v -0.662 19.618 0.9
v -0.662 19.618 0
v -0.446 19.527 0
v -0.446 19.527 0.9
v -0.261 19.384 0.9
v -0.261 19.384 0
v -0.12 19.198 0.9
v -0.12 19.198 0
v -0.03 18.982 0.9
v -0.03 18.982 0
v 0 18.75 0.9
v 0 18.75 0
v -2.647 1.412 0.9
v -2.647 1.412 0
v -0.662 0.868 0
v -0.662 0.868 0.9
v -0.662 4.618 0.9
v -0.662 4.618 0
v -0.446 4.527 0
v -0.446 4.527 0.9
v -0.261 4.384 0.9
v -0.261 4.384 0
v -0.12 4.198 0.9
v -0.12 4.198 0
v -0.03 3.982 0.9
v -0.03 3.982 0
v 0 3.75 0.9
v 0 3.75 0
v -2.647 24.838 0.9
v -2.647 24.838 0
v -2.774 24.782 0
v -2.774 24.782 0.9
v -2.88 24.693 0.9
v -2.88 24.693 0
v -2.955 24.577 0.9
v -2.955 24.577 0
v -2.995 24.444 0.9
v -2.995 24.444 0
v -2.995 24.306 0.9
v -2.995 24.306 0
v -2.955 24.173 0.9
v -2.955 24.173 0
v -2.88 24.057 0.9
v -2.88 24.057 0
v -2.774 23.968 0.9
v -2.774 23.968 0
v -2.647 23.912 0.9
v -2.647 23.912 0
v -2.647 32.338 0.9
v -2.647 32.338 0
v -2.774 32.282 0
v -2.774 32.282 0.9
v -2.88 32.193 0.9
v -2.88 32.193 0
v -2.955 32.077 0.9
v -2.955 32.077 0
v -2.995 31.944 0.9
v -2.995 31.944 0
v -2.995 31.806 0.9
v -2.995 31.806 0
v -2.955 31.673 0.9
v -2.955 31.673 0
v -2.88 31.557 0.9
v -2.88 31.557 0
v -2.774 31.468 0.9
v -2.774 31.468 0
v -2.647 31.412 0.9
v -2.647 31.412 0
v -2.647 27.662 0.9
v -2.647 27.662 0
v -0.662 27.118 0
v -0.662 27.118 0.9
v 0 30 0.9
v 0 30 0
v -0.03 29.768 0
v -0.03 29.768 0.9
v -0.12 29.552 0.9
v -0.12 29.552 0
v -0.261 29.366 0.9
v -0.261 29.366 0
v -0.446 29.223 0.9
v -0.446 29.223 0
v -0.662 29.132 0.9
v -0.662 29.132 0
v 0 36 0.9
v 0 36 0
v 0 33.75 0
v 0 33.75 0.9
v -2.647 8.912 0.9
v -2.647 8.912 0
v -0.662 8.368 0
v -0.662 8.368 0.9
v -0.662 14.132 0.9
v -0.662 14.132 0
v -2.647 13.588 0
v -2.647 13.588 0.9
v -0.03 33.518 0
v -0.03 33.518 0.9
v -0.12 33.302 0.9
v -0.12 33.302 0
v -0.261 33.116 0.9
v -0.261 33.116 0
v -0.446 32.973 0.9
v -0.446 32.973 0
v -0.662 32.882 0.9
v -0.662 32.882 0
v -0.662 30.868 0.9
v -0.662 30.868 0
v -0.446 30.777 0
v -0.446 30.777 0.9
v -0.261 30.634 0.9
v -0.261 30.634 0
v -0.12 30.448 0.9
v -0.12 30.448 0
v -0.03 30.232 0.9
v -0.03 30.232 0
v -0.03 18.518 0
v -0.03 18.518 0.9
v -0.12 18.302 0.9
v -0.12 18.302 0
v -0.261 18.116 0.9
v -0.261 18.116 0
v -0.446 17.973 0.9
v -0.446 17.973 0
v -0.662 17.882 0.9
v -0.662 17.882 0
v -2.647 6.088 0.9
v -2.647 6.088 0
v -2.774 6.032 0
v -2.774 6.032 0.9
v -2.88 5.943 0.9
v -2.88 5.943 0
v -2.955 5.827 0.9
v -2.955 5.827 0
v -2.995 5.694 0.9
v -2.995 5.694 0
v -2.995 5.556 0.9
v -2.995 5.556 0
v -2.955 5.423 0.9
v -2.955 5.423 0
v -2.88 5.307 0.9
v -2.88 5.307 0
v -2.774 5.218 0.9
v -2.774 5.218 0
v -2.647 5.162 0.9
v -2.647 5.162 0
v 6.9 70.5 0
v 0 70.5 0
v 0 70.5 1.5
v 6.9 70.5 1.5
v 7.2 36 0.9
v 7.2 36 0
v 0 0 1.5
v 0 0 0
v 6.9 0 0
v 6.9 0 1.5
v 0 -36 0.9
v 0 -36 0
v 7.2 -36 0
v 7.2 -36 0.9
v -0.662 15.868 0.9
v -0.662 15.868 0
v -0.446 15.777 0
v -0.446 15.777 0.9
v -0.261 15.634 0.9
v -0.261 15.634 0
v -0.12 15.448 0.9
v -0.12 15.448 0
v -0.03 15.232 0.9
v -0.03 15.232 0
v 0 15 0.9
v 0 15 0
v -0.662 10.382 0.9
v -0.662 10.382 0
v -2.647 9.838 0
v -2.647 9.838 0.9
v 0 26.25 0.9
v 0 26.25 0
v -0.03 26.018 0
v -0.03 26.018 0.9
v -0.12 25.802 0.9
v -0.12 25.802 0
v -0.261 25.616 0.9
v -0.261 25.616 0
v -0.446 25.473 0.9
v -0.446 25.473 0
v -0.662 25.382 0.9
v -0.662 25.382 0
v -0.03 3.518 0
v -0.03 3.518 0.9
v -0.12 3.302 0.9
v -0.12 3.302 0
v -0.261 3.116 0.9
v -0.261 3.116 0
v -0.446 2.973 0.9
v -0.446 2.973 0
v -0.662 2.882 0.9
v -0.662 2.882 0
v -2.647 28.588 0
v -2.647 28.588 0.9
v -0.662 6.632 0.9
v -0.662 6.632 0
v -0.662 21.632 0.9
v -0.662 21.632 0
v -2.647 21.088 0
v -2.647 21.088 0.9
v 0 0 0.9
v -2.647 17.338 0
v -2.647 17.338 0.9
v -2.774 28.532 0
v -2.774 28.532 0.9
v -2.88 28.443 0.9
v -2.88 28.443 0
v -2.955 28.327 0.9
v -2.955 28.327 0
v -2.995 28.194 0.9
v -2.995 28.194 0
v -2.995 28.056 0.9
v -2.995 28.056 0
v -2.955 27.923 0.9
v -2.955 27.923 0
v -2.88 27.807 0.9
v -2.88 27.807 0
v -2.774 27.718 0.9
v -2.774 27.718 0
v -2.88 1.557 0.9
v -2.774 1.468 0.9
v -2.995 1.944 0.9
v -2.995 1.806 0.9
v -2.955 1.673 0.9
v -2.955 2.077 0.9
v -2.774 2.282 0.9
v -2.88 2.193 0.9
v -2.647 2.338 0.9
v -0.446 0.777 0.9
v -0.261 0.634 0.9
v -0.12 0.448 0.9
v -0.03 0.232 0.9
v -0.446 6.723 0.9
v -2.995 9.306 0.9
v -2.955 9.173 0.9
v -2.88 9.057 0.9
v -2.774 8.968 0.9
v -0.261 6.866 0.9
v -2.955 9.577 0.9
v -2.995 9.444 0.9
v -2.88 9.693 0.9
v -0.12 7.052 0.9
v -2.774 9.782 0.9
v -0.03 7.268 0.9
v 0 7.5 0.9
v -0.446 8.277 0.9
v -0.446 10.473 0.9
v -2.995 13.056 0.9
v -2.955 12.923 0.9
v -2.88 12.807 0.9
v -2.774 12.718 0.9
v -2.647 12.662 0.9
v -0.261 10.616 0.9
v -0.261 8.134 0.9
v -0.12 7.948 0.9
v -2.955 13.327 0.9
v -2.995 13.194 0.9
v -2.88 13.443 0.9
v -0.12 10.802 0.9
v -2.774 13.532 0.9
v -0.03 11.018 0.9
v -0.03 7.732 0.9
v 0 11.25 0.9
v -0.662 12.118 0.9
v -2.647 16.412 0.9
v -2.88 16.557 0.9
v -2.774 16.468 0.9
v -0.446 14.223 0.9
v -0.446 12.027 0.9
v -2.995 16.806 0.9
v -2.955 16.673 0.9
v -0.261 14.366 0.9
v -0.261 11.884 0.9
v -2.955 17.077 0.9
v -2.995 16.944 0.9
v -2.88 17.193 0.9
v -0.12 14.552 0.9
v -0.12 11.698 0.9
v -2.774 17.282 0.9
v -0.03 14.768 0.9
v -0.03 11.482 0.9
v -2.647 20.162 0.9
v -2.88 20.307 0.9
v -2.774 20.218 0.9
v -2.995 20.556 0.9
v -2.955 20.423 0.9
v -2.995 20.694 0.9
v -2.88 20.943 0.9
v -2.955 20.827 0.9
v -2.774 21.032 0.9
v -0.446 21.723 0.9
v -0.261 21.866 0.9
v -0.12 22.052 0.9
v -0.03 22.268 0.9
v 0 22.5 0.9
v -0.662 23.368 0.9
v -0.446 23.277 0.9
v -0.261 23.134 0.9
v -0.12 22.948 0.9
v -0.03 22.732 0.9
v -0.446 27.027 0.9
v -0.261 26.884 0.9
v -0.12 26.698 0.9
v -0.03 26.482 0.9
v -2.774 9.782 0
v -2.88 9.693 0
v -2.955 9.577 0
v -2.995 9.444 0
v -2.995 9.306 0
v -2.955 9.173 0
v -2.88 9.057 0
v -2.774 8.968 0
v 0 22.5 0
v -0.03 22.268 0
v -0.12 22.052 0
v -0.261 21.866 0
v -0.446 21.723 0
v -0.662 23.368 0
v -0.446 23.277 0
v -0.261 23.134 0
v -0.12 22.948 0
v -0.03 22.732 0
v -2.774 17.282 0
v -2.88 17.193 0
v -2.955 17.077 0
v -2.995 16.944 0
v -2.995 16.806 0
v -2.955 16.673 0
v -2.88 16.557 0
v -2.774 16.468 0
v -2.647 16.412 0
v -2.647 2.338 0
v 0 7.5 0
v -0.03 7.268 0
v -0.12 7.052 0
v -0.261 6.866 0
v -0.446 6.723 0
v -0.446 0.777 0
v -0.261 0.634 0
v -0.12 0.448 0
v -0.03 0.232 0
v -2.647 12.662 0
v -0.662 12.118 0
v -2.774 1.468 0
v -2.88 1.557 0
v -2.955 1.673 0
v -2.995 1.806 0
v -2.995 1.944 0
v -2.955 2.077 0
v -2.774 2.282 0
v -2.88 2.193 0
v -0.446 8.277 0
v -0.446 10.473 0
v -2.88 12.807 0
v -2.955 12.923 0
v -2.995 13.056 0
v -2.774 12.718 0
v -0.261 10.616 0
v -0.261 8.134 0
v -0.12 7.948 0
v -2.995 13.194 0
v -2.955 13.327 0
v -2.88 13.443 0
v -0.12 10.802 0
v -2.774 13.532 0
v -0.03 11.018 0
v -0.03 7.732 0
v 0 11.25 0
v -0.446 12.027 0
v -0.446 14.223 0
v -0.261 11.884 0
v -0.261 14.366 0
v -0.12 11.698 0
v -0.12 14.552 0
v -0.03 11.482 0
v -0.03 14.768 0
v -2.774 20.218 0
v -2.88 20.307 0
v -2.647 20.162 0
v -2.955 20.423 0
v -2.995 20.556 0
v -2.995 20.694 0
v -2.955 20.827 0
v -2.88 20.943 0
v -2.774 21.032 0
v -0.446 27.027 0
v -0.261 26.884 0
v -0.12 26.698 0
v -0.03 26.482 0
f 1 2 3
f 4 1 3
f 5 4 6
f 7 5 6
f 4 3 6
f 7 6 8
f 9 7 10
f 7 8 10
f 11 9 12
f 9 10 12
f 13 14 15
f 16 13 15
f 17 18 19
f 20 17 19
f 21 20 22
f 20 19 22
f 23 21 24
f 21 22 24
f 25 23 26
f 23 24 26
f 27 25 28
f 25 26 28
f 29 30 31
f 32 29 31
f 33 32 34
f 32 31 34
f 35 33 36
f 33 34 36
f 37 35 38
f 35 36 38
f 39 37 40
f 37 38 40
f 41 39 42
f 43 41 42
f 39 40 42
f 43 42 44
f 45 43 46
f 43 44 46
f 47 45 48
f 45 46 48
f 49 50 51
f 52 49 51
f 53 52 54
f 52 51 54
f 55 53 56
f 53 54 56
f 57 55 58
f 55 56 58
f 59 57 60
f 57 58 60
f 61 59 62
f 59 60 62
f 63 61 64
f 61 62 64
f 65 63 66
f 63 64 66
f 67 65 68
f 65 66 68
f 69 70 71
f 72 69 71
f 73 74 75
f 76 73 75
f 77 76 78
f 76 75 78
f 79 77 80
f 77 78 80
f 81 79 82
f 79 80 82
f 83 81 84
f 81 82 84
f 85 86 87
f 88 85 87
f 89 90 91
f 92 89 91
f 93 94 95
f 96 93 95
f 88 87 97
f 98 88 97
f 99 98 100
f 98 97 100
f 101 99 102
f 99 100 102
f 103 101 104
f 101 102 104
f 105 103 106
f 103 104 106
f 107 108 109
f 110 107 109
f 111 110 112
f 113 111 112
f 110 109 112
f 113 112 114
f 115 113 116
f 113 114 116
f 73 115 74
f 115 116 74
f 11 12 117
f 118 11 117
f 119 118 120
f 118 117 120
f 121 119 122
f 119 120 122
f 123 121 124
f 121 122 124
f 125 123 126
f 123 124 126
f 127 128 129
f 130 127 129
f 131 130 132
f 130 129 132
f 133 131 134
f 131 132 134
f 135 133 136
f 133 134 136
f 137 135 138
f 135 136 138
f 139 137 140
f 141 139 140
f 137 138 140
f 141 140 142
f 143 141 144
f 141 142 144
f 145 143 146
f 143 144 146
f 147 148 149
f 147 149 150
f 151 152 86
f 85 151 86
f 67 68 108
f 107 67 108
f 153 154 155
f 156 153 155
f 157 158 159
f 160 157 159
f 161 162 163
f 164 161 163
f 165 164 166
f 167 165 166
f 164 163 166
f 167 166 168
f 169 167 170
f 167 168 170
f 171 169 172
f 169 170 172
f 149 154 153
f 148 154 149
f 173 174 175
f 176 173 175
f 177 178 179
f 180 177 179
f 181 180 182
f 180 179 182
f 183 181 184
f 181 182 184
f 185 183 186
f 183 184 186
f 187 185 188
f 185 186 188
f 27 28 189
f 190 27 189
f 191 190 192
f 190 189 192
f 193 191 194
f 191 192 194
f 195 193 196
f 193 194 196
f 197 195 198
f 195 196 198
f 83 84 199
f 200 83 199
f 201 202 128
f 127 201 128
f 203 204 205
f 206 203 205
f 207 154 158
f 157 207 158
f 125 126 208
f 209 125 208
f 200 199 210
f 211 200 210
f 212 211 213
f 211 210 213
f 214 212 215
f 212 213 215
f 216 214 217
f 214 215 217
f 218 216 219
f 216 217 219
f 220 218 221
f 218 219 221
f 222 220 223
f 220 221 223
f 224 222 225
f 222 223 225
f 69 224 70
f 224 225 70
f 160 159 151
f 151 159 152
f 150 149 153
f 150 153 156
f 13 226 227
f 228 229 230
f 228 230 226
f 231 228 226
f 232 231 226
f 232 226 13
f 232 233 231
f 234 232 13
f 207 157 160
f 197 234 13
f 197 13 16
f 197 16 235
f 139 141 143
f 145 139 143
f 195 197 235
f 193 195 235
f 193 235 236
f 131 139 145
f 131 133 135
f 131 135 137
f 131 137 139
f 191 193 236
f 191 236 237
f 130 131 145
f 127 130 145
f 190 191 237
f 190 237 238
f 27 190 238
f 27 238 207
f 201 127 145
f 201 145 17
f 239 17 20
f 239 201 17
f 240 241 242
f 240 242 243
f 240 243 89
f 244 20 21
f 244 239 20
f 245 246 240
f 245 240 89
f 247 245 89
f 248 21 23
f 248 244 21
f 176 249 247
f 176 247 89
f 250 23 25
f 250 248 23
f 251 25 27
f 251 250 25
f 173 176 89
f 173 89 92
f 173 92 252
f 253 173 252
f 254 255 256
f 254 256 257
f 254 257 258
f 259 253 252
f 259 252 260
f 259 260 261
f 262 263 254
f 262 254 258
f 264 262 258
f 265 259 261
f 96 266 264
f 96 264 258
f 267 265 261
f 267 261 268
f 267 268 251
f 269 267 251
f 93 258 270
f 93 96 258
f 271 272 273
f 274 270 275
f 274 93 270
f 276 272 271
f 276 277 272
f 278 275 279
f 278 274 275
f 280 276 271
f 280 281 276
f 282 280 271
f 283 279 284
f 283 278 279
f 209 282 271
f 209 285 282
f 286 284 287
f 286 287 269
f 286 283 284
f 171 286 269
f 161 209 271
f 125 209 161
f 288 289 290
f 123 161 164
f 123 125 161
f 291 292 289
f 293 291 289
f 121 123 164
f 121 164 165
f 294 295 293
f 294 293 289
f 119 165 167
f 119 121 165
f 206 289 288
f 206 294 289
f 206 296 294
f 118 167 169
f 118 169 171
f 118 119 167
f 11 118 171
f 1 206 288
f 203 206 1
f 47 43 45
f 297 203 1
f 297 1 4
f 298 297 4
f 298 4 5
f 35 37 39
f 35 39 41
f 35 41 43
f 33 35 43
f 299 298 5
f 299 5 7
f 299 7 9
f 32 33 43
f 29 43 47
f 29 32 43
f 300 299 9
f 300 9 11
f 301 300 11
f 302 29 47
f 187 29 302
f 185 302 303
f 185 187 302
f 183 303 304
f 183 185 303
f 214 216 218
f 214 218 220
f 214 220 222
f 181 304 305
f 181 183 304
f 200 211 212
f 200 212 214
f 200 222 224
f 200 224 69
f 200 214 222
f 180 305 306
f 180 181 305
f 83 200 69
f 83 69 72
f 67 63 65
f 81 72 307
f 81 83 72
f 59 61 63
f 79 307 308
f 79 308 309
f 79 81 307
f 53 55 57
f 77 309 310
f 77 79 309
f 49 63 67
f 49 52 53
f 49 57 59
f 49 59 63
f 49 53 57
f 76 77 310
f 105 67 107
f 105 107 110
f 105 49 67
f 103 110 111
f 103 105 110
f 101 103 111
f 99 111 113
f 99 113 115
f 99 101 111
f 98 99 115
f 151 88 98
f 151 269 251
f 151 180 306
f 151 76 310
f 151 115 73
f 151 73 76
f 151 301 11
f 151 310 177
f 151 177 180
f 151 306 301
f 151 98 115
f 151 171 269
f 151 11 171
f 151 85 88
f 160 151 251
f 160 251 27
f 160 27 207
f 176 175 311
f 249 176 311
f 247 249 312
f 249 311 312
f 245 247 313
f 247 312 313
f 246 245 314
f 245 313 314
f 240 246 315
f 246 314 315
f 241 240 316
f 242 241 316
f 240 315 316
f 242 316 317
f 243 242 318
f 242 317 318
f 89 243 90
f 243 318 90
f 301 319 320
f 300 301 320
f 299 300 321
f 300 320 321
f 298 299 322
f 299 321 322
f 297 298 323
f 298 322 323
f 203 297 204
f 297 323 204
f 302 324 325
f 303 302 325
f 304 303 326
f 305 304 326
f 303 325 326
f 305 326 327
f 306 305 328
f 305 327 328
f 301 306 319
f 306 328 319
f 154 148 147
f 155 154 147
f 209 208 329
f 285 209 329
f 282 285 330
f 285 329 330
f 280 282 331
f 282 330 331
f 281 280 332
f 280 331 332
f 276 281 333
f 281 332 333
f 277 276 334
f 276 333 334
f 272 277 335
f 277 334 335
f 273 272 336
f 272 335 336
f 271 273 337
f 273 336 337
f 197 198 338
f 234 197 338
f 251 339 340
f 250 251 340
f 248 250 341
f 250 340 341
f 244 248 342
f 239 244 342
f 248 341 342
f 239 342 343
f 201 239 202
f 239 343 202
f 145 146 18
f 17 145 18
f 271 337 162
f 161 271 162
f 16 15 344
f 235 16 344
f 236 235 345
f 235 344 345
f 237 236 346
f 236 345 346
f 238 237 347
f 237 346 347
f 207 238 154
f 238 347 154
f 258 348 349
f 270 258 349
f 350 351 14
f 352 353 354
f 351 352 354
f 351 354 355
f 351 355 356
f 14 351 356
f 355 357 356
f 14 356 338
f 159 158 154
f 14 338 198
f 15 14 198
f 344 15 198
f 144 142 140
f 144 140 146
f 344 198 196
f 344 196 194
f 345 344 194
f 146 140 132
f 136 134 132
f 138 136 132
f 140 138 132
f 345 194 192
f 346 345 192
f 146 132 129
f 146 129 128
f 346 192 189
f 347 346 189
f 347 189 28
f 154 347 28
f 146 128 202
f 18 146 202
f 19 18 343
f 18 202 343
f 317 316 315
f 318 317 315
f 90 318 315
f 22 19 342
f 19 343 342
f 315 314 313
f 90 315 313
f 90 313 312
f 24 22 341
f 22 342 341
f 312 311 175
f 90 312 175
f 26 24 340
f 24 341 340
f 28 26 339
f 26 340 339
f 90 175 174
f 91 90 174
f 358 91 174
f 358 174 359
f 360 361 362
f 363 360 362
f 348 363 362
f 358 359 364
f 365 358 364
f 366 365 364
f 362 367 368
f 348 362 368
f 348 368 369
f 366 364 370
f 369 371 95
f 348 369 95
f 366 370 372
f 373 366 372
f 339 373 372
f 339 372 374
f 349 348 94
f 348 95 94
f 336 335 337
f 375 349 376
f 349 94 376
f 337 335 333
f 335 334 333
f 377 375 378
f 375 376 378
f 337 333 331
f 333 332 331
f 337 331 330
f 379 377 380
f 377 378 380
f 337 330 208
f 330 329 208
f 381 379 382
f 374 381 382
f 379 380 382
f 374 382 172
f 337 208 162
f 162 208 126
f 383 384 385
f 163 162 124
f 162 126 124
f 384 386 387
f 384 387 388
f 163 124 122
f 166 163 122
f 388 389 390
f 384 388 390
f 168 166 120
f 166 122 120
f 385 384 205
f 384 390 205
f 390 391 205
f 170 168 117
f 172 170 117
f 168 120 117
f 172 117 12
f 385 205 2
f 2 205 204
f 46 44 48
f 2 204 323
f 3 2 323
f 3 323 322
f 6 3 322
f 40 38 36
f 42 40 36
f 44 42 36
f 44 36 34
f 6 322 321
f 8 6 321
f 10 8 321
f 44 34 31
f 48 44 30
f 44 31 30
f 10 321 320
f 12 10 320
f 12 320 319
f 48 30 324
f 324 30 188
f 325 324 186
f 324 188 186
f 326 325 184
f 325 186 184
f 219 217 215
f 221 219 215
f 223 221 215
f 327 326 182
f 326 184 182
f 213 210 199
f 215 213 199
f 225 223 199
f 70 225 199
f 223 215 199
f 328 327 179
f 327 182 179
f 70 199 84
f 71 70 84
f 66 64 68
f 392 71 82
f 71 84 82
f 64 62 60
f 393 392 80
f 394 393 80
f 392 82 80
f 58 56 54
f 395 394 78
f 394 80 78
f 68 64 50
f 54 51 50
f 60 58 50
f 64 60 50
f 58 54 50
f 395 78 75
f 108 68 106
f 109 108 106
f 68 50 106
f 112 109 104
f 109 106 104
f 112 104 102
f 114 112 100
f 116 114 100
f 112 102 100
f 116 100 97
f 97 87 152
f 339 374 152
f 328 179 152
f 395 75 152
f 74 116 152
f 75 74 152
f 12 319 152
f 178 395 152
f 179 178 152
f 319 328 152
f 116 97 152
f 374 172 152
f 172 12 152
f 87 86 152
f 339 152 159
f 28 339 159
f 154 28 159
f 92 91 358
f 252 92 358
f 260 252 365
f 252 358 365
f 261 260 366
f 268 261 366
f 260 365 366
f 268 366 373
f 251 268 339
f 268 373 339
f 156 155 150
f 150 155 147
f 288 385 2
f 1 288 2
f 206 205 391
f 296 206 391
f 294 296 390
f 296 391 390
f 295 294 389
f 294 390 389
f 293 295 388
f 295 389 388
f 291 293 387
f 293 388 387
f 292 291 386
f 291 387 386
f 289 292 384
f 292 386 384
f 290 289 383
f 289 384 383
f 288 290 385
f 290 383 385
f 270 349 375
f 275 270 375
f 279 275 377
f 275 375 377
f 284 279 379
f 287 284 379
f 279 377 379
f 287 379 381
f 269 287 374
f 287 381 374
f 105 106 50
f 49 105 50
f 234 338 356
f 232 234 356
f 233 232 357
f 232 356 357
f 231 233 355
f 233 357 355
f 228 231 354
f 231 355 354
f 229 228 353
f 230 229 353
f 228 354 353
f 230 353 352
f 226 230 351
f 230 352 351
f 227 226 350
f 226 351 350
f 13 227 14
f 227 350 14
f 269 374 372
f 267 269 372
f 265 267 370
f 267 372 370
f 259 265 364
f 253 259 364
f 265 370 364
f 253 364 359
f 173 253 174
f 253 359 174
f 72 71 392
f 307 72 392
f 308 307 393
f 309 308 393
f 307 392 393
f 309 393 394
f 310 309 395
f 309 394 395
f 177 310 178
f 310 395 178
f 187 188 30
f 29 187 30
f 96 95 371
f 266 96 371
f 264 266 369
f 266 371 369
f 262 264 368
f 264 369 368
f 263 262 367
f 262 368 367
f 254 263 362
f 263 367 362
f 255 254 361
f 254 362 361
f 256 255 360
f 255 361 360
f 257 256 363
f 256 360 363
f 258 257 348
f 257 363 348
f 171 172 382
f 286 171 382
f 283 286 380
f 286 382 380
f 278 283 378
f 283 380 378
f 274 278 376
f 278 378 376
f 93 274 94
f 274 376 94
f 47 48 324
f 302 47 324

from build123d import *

# Parameters (mm, degrees)
F1_DEPTH = 0.3
F2_W     = 2.3
F2_H     = 23.5
F3_DEPTH = 0.5
F4_SCALE = 3


with BuildPart() as f1:
    # F0 (on Top) → F1 (new body)
    with BuildSketch(Plane.XY):
        with BuildLine():
            Line((0, 10), (0, 11.25))
            ThreePointArc((0, 11.25), (-0.0614693449, 11.0680573536), (-0.2206875105, 10.9606740091))
            Line((-0.2206875105, 10.9606740091), (-0.8822999944, 10.7793071951))
            ThreePointArc((-0.8822999944, 10.7793071951), (-1, 10.625), (-0.8822999944, 10.4706928049))
            Line((-0.8822999944, 10.4706928049), (-0.2206875105, 10.2893259909))
            ThreePointArc((-0.2206875105, 10.2893259909), (-0.0614693449, 10.1819426464), (0, 10))
        make_face()
        with BuildLine():
            Line((0, 8.75), (0, 10))
            ThreePointArc((0, 10), (-0.0614693449, 9.8180573536), (-0.2206875105, 9.7106740091))
            Line((-0.2206875105, 9.7106740091), (-0.8822999944, 9.5293071951))
            ThreePointArc((-0.8822999944, 9.5293071951), (-1, 9.375), (-0.8822999944, 9.2206928049))
            Line((-0.8822999944, 9.2206928049), (-0.2206875105, 9.0393259909))
            ThreePointArc((-0.2206875105, 9.0393259909), (-0.0614693449, 8.9319426464), (0, 8.75))
        make_face()
        with BuildLine():
            Line((0, 7.5), (0, 8.75))
            ThreePointArc((0, 8.75), (-0.0614693449, 8.5680573536), (-0.2206875105, 8.4606740091))
            Line((-0.2206875105, 8.4606740091), (-0.8822999944, 8.2793071951))
            ThreePointArc((-0.8822999944, 8.2793071951), (-1, 8.125), (-0.8822999944, 7.9706928049))
            Line((-0.8822999944, 7.9706928049), (-0.2206875105, 7.7893259909))
            ThreePointArc((-0.2206875105, 7.7893259909), (-0.0614693449, 7.6819426464), (0, 7.5))
        make_face()
        with BuildLine():
            Line((0, 6.25), (0, 7.5))
            ThreePointArc((0, 7.5), (-0.0614693449, 7.3180573536), (-0.2206875105, 7.2106740091))
            Line((-0.2206875105, 7.2106740091), (-0.8822999944, 7.0293071951))
            ThreePointArc((-0.8822999944, 7.0293071951), (-1, 6.875), (-0.8822999944, 6.7206928049))
            Line((-0.8822999944, 6.7206928049), (-0.2206875105, 6.5393259909))
            ThreePointArc((-0.2206875105, 6.5393259909), (-0.0614693449, 6.4319426464), (0, 6.25))
        make_face()
        with BuildLine():
            Line((0, 5), (0, 6.25))
            ThreePointArc((0, 6.25), (-0.0614693449, 6.0680573536), (-0.2206875105, 5.9606740091))
            Line((-0.2206875105, 5.9606740091), (-0.8822999944, 5.7793071951))
            ThreePointArc((-0.8822999944, 5.7793071951), (-1, 5.625), (-0.8822999944, 5.4706928049))
            Line((-0.8822999944, 5.4706928049), (-0.2206875105, 5.2893259909))
            ThreePointArc((-0.2206875105, 5.2893259909), (-0.0614693449, 5.1819426464), (0, 5))
        make_face()
        with BuildLine():
            Line((0, 3.75), (0, 5))
            ThreePointArc((0, 5), (-0.0614693449, 4.8180573536), (-0.2206875105, 4.7106740091))
            Line((-0.2206875105, 4.7106740091), (-0.8822999944, 4.5293071951))
            ThreePointArc((-0.8822999944, 4.5293071951), (-1, 4.375), (-0.8822999944, 4.2206928049))
            Line((-0.8822999944, 4.2206928049), (-0.2206875105, 4.0393259909))
            ThreePointArc((-0.2206875105, 4.0393259909), (-0.0614693449, 3.9319426464), (0, 3.75))
        make_face()
        with BuildLine():
            ThreePointArc((-0.2206875105, 2.7893259909), (-0.0614693449, 2.6819426464), (0, 2.5))
            Line((0, 2.5), (0, 3.75))
            ThreePointArc((0, 3.75), (-0.0614693449, 3.5680573536), (-0.2206875105, 3.4606740091))
            Line((-0.2206875105, 3.4606740091), (-0.8822999944, 3.2793071951))
            ThreePointArc((-0.8822999944, 3.2793071951), (-1, 3.125), (-0.8822999944, 2.9706928049))
            Line((-0.8822999944, 2.9706928049), (-0.2206875105, 2.7893259909))
        make_face()
        with BuildLine():
            ThreePointArc((-0.2206875105, 1.5393259909), (-0.0614693449, 1.4319426464), (0, 1.25))
            Line((0, 1.25), (0, 2.5))
            ThreePointArc((0, 2.5), (-0.0614693449, 2.3180573536), (-0.2206875105, 2.2106740091))
            Line((-0.2206875105, 2.2106740091), (-0.8822999944, 2.0293071951))
            ThreePointArc((-0.8822999944, 2.0293071951), (-1, 1.875), (-0.8822999944, 1.7206928049))
            Line((-0.8822999944, 1.7206928049), (-0.2206875105, 1.5393259909))
        make_face()
        with BuildLine():
            ThreePointArc((-0.2206875105, 0.2893259909), (-0.0614693449, 0.1819426464), (0, 0))
            Line((0, 0), (0, 1.25))
            ThreePointArc((0, 1.25), (-0.0614693449, 1.0680573536), (-0.2206875105, 0.9606740091))
            Line((-0.2206875105, 0.9606740091), (-0.8822999944, 0.7793071951))
            ThreePointArc((-0.8822999944, 0.7793071951), (-1, 0.625), (-0.8822999944, 0.4706928049))
            Line((-0.8822999944, 0.4706928049), (-0.2206875105, 0.2893259909))
        make_face()
        Polygon((2.4, 12), (0, 12), (0, 11.25), (0, 10), (0, 8.75), (0, 7.5), (0, 6.25), (0, 5), (0, 3.75), (0, 2.5), (0, 1.25), (0, 0), (0, -12), (2.4, -12), align=None)
    extrude(amount=F1_DEPTH)


with BuildPart() as f3:
    # F2 (on Top) → F3 (new body)
    with BuildSketch(Plane.XY):
        with Locations((1.15, 11.75)):
            Rectangle(F2_W, F2_H)
    extrude(amount=F3_DEPTH)


with BuildPart() as f3_1:
    # F4: moved
    add(f3.part.scale(F4_SCALE))


with BuildPart() as f1_1:
    # F4: moved
    add(f1.part.scale(F4_SCALE))


solid = Compound([f3_1.part, f1_1.part])
